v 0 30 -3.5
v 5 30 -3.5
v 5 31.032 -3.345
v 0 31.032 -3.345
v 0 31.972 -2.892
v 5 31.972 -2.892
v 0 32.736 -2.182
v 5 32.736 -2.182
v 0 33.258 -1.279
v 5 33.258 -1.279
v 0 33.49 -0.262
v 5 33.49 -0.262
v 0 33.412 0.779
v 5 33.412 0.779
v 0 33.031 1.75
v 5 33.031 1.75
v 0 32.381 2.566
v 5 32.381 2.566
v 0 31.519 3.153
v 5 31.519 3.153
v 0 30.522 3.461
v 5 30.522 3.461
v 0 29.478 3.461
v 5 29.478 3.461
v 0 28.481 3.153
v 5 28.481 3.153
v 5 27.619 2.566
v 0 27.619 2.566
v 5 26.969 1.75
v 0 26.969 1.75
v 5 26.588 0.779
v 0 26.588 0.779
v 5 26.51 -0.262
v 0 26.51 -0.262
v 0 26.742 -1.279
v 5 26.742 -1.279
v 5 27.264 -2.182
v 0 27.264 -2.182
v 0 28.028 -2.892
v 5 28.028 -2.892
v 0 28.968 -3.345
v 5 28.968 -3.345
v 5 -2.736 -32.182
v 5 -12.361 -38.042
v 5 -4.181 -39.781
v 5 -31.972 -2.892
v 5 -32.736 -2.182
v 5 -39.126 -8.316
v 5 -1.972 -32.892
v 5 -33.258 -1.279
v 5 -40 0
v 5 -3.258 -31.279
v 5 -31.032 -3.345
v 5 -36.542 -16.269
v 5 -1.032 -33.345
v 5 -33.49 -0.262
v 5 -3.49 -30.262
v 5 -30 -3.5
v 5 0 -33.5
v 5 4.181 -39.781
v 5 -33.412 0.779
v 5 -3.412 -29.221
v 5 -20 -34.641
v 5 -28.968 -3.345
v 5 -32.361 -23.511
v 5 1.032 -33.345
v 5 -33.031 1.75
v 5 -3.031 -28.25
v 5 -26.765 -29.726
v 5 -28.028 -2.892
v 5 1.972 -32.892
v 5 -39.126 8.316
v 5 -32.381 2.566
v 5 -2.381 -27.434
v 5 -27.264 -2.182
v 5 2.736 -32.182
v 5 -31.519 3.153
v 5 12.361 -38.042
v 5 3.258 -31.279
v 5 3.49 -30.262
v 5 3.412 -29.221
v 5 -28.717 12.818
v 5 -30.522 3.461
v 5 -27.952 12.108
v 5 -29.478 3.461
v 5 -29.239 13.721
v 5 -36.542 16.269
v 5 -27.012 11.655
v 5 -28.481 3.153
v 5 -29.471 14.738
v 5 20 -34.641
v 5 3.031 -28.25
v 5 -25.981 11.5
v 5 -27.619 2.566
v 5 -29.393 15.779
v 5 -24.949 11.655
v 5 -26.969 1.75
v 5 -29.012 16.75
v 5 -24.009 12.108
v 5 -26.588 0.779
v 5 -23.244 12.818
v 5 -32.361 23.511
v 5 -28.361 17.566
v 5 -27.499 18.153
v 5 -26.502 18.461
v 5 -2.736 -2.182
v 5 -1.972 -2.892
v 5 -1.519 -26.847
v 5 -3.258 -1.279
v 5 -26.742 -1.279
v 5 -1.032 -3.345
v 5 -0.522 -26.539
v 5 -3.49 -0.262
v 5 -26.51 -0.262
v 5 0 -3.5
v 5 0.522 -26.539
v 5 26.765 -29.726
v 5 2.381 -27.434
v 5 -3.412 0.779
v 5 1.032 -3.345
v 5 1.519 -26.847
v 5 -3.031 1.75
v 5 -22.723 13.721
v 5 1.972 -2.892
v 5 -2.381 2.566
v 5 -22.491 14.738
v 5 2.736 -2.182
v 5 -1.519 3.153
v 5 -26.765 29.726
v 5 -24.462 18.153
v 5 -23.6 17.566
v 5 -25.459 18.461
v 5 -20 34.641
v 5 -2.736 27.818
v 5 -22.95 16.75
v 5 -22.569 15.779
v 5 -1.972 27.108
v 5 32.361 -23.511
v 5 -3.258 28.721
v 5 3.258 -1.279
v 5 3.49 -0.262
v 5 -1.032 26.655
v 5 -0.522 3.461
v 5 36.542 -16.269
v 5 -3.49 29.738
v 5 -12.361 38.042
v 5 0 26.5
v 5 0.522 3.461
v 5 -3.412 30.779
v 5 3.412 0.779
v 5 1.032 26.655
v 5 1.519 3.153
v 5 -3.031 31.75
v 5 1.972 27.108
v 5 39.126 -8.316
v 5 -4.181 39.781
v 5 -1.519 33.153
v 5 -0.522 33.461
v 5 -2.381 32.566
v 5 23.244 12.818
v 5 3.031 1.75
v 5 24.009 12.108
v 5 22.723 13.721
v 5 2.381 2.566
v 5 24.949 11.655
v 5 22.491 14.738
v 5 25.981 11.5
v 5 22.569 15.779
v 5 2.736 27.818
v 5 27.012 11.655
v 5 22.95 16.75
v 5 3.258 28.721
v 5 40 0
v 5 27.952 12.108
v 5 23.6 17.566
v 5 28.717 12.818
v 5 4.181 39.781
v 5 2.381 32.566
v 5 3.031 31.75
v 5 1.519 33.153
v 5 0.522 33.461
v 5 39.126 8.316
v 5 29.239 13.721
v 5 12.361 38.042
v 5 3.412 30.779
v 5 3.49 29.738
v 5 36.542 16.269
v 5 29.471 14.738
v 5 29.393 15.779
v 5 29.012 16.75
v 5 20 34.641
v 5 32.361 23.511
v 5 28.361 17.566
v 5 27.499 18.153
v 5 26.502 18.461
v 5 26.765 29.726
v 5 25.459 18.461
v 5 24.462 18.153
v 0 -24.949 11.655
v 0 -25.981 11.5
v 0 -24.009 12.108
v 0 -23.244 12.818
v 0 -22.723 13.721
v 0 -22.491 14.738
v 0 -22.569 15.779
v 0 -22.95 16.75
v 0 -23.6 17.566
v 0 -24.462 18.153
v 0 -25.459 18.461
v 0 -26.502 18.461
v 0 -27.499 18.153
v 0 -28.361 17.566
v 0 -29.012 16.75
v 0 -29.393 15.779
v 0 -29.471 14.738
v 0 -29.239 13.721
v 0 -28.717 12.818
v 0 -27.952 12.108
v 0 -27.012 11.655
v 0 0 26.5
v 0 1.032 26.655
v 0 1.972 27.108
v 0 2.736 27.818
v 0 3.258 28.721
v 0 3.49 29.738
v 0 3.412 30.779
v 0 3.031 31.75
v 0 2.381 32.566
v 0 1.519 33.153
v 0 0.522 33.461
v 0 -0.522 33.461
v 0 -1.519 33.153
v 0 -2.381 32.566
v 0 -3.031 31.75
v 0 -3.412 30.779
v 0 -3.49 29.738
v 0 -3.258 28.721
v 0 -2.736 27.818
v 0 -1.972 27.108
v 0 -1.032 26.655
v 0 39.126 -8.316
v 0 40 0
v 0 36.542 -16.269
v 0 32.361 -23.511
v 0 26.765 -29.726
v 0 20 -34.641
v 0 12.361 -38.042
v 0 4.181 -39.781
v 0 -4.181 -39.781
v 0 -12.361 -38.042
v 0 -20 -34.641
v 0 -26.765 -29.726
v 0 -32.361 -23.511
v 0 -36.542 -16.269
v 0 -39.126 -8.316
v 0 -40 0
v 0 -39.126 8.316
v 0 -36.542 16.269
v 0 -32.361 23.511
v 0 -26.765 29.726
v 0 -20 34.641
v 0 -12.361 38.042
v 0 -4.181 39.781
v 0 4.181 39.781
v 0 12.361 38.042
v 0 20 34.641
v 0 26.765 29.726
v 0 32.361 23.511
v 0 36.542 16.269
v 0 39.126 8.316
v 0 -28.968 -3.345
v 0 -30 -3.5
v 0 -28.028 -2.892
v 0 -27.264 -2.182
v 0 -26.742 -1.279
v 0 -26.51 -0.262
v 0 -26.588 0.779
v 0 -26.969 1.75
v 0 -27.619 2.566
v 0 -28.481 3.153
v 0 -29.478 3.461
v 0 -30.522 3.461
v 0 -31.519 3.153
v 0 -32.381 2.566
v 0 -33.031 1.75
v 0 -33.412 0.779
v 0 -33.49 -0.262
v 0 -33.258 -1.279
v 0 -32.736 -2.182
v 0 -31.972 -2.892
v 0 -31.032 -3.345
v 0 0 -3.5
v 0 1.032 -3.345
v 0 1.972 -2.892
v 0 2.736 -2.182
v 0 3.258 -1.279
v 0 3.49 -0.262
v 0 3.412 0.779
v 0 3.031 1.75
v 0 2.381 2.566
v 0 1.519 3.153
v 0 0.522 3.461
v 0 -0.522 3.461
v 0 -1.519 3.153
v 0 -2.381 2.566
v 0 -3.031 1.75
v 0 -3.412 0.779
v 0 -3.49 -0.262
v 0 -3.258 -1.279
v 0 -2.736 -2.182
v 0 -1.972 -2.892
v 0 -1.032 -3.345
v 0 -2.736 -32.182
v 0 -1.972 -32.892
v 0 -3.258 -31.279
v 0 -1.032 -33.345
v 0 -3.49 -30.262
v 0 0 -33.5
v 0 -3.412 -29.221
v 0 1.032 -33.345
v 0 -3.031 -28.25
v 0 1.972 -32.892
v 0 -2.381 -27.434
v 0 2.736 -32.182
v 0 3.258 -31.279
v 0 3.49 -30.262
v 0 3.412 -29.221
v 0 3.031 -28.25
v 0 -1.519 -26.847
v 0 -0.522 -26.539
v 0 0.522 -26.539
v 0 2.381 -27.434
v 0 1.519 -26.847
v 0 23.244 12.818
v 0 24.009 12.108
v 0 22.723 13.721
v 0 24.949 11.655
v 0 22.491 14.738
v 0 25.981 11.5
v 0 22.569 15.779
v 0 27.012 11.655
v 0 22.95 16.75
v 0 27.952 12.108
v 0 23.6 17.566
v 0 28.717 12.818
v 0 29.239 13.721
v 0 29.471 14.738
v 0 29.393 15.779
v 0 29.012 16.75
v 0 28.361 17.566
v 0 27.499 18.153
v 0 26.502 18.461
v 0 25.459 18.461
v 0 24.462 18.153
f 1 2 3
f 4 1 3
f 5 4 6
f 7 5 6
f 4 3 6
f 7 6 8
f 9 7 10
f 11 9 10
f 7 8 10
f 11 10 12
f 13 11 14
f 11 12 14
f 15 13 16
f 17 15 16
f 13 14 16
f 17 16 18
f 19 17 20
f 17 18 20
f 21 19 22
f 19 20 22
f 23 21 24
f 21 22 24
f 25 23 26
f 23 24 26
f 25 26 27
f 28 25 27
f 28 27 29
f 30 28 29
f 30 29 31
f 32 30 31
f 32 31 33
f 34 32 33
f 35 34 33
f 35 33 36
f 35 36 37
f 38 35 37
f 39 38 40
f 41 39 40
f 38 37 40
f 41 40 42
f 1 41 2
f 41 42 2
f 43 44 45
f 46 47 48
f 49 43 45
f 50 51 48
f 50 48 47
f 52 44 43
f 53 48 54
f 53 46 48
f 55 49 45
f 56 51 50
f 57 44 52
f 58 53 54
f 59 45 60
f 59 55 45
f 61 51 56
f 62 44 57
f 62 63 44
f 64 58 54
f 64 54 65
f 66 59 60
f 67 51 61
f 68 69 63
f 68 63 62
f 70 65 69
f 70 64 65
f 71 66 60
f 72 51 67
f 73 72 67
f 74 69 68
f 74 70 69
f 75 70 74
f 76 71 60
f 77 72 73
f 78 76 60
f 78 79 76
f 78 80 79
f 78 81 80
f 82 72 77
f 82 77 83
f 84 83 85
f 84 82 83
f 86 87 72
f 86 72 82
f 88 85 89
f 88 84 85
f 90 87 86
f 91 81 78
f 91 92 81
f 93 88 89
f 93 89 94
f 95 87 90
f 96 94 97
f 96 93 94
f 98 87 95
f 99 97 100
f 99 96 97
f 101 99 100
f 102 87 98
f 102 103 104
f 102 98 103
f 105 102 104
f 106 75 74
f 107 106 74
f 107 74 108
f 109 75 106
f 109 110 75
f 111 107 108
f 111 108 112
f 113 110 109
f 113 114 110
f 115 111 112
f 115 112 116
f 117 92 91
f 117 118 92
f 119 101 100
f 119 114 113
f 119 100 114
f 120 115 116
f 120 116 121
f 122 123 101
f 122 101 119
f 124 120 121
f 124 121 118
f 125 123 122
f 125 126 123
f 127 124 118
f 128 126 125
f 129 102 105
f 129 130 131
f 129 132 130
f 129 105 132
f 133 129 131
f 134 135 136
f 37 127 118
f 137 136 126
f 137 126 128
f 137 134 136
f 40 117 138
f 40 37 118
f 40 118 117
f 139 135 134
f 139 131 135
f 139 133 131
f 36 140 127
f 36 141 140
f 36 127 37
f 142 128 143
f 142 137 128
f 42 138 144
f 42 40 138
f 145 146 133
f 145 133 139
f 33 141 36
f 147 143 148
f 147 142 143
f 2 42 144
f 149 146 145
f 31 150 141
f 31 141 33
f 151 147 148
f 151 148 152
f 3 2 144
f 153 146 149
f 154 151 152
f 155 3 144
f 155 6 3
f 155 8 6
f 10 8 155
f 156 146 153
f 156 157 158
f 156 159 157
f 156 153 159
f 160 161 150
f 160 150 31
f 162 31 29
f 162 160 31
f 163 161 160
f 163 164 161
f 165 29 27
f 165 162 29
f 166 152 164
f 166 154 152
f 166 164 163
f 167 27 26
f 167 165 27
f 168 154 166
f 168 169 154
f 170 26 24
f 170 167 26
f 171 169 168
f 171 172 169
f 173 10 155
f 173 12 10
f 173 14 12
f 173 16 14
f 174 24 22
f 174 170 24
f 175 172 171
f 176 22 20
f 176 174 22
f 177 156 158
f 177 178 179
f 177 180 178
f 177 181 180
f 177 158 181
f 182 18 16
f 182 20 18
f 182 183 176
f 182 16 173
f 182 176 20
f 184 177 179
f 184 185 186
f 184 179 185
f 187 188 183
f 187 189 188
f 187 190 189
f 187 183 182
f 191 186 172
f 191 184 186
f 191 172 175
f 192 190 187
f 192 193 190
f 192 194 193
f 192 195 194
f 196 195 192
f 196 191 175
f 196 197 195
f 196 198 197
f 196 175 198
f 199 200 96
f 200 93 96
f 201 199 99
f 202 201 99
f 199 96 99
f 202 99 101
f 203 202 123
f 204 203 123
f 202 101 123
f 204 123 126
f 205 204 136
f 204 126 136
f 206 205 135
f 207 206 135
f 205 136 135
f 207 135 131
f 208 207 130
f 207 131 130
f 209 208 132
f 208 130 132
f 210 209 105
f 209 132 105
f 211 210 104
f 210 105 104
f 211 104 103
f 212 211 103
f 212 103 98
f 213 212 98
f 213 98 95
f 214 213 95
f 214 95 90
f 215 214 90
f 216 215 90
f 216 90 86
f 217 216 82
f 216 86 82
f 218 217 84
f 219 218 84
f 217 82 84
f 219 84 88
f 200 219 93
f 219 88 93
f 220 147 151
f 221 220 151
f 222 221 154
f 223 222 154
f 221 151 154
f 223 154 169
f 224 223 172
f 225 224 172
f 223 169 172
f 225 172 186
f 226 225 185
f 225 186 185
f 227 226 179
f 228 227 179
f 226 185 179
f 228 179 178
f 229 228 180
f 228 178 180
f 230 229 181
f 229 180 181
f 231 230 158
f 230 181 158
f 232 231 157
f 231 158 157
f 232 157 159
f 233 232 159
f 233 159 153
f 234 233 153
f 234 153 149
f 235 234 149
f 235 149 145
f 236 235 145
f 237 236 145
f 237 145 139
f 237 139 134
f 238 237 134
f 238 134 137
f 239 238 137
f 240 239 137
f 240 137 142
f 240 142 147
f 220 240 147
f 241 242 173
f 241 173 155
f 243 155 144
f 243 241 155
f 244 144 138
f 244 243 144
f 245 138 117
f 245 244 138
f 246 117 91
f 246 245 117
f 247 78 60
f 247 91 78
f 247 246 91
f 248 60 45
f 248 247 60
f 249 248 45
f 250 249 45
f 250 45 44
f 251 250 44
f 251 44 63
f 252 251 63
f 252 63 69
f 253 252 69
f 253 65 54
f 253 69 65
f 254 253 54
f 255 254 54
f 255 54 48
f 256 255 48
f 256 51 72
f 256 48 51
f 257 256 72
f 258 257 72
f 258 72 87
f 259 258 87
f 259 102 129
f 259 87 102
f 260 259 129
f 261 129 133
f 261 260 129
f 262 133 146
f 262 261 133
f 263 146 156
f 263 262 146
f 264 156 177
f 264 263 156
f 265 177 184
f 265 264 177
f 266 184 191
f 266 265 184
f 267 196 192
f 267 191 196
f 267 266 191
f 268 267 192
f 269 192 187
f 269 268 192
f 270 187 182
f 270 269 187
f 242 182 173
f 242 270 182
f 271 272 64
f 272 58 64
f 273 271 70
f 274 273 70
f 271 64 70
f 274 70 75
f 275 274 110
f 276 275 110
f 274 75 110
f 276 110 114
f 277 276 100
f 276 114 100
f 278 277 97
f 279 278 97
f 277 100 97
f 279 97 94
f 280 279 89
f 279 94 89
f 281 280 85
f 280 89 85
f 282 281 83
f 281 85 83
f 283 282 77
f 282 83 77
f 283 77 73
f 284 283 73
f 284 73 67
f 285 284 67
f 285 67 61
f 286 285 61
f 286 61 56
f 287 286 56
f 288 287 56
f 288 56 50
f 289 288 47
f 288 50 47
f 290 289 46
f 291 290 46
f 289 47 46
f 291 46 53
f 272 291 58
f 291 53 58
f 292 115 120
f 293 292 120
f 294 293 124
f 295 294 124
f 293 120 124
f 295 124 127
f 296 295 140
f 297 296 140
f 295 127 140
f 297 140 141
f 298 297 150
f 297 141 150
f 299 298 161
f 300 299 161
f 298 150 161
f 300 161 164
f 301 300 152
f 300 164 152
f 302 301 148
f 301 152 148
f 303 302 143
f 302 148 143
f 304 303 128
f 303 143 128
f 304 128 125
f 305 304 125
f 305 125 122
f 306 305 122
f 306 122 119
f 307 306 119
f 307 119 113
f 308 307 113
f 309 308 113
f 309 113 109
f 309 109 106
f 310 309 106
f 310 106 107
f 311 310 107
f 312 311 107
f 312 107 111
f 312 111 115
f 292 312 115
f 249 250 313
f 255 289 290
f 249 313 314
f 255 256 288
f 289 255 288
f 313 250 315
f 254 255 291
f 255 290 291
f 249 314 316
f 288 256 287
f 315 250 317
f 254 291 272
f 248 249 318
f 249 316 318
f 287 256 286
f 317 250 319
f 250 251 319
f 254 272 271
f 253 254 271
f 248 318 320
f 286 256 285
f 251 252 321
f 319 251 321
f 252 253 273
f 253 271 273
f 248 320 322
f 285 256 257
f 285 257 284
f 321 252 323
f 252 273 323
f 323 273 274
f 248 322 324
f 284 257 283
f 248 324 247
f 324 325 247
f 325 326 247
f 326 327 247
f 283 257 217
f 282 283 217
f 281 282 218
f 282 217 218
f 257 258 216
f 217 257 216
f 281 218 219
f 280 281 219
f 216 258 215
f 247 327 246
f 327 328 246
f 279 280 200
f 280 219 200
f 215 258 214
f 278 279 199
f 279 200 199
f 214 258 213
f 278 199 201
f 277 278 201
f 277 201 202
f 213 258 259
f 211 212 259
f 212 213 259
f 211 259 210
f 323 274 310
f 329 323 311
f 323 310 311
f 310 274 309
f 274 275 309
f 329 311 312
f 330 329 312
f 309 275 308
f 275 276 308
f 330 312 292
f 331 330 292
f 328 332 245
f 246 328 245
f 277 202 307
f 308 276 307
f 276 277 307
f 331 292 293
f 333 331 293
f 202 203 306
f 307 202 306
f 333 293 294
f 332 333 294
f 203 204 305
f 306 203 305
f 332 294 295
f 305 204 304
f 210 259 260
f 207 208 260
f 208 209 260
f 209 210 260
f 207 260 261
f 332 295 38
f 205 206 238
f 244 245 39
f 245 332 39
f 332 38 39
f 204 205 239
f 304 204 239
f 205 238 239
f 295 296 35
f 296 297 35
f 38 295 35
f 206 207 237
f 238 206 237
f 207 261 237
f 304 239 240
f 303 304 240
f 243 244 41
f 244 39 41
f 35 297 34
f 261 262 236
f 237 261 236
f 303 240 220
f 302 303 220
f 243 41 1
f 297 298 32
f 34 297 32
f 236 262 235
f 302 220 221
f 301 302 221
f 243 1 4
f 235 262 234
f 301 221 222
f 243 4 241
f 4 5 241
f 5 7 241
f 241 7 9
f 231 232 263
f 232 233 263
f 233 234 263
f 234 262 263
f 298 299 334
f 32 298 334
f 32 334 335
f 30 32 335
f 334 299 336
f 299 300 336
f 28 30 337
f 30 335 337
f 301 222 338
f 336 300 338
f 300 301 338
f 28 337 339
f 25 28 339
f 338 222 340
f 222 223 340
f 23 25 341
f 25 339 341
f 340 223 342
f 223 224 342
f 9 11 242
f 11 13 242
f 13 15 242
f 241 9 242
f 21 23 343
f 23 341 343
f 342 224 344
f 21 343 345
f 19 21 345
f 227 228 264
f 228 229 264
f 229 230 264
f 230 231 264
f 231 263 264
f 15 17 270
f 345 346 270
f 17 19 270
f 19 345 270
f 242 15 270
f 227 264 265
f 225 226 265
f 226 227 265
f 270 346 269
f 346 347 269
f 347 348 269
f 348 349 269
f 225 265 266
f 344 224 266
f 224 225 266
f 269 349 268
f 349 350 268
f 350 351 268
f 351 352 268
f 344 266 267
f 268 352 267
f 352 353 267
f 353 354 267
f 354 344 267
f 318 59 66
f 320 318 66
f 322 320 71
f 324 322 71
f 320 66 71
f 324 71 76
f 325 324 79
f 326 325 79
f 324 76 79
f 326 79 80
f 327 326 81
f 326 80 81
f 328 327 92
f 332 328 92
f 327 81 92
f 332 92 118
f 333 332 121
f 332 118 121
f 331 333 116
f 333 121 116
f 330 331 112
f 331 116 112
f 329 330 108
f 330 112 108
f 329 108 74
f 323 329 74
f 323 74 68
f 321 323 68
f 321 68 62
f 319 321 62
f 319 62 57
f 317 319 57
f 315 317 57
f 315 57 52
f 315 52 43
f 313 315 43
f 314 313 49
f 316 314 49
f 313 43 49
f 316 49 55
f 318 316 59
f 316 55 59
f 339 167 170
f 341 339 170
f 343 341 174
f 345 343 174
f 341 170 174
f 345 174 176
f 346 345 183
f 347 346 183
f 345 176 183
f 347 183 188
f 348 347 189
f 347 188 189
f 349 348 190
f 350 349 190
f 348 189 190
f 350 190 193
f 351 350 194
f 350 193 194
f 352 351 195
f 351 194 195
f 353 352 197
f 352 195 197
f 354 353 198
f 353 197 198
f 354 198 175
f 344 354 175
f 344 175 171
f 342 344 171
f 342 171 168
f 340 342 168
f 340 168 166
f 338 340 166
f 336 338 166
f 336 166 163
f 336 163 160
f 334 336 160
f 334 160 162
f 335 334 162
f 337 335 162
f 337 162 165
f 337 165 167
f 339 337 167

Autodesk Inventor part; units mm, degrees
ref_plane "YZ Plane" through (0, 0, 0) normal (1, 0, 0) x (0, 1, 0)
ref_plane "XZ Plane" through (0, 0, 0) normal (0, 1, 0) x (-1, 0, 0)
ref_plane "XY Plane" through (0, 0, 0) normal (0, 0, 1) x (1, 0, 0)
sketch "Sketch1" plane through (0, 0, 0) normal (1, 0, 0) x (0, 1, 0)
  circle A0 centre (0, 0) radius 40
  dimension "d0" = 80
extrude "Extrusion1" add sketch "Sketch1" along normal blind 5
sketch "Sketch2" plane through (5, 0, 0) normal (1, 0, 0) x (0, 0, -1)
  circle A0 centre (30, 0) radius 3.5
  circle A1 centre (0, 0) radius 3.5
  circle A2 centre (0, 30) radius 3.5
  circle A3 centre (-30, 0) radius 3.5
  circle A4 centre (0, -30) radius 3.5
  circle A5 centre (-15, 25.9808) radius 3.5
  circle A6 centre (-15, -25.9808) radius 3.5
  dimension "d3" = 7
  dimension "d4" = 30
  dimension "d5" = 7
  dimension "d8" = 360
  dimension "d12" = 360
extrude "Extrusion2" cut sketch "Sketch2" against normal through all
properties part number "end effector Plate"
